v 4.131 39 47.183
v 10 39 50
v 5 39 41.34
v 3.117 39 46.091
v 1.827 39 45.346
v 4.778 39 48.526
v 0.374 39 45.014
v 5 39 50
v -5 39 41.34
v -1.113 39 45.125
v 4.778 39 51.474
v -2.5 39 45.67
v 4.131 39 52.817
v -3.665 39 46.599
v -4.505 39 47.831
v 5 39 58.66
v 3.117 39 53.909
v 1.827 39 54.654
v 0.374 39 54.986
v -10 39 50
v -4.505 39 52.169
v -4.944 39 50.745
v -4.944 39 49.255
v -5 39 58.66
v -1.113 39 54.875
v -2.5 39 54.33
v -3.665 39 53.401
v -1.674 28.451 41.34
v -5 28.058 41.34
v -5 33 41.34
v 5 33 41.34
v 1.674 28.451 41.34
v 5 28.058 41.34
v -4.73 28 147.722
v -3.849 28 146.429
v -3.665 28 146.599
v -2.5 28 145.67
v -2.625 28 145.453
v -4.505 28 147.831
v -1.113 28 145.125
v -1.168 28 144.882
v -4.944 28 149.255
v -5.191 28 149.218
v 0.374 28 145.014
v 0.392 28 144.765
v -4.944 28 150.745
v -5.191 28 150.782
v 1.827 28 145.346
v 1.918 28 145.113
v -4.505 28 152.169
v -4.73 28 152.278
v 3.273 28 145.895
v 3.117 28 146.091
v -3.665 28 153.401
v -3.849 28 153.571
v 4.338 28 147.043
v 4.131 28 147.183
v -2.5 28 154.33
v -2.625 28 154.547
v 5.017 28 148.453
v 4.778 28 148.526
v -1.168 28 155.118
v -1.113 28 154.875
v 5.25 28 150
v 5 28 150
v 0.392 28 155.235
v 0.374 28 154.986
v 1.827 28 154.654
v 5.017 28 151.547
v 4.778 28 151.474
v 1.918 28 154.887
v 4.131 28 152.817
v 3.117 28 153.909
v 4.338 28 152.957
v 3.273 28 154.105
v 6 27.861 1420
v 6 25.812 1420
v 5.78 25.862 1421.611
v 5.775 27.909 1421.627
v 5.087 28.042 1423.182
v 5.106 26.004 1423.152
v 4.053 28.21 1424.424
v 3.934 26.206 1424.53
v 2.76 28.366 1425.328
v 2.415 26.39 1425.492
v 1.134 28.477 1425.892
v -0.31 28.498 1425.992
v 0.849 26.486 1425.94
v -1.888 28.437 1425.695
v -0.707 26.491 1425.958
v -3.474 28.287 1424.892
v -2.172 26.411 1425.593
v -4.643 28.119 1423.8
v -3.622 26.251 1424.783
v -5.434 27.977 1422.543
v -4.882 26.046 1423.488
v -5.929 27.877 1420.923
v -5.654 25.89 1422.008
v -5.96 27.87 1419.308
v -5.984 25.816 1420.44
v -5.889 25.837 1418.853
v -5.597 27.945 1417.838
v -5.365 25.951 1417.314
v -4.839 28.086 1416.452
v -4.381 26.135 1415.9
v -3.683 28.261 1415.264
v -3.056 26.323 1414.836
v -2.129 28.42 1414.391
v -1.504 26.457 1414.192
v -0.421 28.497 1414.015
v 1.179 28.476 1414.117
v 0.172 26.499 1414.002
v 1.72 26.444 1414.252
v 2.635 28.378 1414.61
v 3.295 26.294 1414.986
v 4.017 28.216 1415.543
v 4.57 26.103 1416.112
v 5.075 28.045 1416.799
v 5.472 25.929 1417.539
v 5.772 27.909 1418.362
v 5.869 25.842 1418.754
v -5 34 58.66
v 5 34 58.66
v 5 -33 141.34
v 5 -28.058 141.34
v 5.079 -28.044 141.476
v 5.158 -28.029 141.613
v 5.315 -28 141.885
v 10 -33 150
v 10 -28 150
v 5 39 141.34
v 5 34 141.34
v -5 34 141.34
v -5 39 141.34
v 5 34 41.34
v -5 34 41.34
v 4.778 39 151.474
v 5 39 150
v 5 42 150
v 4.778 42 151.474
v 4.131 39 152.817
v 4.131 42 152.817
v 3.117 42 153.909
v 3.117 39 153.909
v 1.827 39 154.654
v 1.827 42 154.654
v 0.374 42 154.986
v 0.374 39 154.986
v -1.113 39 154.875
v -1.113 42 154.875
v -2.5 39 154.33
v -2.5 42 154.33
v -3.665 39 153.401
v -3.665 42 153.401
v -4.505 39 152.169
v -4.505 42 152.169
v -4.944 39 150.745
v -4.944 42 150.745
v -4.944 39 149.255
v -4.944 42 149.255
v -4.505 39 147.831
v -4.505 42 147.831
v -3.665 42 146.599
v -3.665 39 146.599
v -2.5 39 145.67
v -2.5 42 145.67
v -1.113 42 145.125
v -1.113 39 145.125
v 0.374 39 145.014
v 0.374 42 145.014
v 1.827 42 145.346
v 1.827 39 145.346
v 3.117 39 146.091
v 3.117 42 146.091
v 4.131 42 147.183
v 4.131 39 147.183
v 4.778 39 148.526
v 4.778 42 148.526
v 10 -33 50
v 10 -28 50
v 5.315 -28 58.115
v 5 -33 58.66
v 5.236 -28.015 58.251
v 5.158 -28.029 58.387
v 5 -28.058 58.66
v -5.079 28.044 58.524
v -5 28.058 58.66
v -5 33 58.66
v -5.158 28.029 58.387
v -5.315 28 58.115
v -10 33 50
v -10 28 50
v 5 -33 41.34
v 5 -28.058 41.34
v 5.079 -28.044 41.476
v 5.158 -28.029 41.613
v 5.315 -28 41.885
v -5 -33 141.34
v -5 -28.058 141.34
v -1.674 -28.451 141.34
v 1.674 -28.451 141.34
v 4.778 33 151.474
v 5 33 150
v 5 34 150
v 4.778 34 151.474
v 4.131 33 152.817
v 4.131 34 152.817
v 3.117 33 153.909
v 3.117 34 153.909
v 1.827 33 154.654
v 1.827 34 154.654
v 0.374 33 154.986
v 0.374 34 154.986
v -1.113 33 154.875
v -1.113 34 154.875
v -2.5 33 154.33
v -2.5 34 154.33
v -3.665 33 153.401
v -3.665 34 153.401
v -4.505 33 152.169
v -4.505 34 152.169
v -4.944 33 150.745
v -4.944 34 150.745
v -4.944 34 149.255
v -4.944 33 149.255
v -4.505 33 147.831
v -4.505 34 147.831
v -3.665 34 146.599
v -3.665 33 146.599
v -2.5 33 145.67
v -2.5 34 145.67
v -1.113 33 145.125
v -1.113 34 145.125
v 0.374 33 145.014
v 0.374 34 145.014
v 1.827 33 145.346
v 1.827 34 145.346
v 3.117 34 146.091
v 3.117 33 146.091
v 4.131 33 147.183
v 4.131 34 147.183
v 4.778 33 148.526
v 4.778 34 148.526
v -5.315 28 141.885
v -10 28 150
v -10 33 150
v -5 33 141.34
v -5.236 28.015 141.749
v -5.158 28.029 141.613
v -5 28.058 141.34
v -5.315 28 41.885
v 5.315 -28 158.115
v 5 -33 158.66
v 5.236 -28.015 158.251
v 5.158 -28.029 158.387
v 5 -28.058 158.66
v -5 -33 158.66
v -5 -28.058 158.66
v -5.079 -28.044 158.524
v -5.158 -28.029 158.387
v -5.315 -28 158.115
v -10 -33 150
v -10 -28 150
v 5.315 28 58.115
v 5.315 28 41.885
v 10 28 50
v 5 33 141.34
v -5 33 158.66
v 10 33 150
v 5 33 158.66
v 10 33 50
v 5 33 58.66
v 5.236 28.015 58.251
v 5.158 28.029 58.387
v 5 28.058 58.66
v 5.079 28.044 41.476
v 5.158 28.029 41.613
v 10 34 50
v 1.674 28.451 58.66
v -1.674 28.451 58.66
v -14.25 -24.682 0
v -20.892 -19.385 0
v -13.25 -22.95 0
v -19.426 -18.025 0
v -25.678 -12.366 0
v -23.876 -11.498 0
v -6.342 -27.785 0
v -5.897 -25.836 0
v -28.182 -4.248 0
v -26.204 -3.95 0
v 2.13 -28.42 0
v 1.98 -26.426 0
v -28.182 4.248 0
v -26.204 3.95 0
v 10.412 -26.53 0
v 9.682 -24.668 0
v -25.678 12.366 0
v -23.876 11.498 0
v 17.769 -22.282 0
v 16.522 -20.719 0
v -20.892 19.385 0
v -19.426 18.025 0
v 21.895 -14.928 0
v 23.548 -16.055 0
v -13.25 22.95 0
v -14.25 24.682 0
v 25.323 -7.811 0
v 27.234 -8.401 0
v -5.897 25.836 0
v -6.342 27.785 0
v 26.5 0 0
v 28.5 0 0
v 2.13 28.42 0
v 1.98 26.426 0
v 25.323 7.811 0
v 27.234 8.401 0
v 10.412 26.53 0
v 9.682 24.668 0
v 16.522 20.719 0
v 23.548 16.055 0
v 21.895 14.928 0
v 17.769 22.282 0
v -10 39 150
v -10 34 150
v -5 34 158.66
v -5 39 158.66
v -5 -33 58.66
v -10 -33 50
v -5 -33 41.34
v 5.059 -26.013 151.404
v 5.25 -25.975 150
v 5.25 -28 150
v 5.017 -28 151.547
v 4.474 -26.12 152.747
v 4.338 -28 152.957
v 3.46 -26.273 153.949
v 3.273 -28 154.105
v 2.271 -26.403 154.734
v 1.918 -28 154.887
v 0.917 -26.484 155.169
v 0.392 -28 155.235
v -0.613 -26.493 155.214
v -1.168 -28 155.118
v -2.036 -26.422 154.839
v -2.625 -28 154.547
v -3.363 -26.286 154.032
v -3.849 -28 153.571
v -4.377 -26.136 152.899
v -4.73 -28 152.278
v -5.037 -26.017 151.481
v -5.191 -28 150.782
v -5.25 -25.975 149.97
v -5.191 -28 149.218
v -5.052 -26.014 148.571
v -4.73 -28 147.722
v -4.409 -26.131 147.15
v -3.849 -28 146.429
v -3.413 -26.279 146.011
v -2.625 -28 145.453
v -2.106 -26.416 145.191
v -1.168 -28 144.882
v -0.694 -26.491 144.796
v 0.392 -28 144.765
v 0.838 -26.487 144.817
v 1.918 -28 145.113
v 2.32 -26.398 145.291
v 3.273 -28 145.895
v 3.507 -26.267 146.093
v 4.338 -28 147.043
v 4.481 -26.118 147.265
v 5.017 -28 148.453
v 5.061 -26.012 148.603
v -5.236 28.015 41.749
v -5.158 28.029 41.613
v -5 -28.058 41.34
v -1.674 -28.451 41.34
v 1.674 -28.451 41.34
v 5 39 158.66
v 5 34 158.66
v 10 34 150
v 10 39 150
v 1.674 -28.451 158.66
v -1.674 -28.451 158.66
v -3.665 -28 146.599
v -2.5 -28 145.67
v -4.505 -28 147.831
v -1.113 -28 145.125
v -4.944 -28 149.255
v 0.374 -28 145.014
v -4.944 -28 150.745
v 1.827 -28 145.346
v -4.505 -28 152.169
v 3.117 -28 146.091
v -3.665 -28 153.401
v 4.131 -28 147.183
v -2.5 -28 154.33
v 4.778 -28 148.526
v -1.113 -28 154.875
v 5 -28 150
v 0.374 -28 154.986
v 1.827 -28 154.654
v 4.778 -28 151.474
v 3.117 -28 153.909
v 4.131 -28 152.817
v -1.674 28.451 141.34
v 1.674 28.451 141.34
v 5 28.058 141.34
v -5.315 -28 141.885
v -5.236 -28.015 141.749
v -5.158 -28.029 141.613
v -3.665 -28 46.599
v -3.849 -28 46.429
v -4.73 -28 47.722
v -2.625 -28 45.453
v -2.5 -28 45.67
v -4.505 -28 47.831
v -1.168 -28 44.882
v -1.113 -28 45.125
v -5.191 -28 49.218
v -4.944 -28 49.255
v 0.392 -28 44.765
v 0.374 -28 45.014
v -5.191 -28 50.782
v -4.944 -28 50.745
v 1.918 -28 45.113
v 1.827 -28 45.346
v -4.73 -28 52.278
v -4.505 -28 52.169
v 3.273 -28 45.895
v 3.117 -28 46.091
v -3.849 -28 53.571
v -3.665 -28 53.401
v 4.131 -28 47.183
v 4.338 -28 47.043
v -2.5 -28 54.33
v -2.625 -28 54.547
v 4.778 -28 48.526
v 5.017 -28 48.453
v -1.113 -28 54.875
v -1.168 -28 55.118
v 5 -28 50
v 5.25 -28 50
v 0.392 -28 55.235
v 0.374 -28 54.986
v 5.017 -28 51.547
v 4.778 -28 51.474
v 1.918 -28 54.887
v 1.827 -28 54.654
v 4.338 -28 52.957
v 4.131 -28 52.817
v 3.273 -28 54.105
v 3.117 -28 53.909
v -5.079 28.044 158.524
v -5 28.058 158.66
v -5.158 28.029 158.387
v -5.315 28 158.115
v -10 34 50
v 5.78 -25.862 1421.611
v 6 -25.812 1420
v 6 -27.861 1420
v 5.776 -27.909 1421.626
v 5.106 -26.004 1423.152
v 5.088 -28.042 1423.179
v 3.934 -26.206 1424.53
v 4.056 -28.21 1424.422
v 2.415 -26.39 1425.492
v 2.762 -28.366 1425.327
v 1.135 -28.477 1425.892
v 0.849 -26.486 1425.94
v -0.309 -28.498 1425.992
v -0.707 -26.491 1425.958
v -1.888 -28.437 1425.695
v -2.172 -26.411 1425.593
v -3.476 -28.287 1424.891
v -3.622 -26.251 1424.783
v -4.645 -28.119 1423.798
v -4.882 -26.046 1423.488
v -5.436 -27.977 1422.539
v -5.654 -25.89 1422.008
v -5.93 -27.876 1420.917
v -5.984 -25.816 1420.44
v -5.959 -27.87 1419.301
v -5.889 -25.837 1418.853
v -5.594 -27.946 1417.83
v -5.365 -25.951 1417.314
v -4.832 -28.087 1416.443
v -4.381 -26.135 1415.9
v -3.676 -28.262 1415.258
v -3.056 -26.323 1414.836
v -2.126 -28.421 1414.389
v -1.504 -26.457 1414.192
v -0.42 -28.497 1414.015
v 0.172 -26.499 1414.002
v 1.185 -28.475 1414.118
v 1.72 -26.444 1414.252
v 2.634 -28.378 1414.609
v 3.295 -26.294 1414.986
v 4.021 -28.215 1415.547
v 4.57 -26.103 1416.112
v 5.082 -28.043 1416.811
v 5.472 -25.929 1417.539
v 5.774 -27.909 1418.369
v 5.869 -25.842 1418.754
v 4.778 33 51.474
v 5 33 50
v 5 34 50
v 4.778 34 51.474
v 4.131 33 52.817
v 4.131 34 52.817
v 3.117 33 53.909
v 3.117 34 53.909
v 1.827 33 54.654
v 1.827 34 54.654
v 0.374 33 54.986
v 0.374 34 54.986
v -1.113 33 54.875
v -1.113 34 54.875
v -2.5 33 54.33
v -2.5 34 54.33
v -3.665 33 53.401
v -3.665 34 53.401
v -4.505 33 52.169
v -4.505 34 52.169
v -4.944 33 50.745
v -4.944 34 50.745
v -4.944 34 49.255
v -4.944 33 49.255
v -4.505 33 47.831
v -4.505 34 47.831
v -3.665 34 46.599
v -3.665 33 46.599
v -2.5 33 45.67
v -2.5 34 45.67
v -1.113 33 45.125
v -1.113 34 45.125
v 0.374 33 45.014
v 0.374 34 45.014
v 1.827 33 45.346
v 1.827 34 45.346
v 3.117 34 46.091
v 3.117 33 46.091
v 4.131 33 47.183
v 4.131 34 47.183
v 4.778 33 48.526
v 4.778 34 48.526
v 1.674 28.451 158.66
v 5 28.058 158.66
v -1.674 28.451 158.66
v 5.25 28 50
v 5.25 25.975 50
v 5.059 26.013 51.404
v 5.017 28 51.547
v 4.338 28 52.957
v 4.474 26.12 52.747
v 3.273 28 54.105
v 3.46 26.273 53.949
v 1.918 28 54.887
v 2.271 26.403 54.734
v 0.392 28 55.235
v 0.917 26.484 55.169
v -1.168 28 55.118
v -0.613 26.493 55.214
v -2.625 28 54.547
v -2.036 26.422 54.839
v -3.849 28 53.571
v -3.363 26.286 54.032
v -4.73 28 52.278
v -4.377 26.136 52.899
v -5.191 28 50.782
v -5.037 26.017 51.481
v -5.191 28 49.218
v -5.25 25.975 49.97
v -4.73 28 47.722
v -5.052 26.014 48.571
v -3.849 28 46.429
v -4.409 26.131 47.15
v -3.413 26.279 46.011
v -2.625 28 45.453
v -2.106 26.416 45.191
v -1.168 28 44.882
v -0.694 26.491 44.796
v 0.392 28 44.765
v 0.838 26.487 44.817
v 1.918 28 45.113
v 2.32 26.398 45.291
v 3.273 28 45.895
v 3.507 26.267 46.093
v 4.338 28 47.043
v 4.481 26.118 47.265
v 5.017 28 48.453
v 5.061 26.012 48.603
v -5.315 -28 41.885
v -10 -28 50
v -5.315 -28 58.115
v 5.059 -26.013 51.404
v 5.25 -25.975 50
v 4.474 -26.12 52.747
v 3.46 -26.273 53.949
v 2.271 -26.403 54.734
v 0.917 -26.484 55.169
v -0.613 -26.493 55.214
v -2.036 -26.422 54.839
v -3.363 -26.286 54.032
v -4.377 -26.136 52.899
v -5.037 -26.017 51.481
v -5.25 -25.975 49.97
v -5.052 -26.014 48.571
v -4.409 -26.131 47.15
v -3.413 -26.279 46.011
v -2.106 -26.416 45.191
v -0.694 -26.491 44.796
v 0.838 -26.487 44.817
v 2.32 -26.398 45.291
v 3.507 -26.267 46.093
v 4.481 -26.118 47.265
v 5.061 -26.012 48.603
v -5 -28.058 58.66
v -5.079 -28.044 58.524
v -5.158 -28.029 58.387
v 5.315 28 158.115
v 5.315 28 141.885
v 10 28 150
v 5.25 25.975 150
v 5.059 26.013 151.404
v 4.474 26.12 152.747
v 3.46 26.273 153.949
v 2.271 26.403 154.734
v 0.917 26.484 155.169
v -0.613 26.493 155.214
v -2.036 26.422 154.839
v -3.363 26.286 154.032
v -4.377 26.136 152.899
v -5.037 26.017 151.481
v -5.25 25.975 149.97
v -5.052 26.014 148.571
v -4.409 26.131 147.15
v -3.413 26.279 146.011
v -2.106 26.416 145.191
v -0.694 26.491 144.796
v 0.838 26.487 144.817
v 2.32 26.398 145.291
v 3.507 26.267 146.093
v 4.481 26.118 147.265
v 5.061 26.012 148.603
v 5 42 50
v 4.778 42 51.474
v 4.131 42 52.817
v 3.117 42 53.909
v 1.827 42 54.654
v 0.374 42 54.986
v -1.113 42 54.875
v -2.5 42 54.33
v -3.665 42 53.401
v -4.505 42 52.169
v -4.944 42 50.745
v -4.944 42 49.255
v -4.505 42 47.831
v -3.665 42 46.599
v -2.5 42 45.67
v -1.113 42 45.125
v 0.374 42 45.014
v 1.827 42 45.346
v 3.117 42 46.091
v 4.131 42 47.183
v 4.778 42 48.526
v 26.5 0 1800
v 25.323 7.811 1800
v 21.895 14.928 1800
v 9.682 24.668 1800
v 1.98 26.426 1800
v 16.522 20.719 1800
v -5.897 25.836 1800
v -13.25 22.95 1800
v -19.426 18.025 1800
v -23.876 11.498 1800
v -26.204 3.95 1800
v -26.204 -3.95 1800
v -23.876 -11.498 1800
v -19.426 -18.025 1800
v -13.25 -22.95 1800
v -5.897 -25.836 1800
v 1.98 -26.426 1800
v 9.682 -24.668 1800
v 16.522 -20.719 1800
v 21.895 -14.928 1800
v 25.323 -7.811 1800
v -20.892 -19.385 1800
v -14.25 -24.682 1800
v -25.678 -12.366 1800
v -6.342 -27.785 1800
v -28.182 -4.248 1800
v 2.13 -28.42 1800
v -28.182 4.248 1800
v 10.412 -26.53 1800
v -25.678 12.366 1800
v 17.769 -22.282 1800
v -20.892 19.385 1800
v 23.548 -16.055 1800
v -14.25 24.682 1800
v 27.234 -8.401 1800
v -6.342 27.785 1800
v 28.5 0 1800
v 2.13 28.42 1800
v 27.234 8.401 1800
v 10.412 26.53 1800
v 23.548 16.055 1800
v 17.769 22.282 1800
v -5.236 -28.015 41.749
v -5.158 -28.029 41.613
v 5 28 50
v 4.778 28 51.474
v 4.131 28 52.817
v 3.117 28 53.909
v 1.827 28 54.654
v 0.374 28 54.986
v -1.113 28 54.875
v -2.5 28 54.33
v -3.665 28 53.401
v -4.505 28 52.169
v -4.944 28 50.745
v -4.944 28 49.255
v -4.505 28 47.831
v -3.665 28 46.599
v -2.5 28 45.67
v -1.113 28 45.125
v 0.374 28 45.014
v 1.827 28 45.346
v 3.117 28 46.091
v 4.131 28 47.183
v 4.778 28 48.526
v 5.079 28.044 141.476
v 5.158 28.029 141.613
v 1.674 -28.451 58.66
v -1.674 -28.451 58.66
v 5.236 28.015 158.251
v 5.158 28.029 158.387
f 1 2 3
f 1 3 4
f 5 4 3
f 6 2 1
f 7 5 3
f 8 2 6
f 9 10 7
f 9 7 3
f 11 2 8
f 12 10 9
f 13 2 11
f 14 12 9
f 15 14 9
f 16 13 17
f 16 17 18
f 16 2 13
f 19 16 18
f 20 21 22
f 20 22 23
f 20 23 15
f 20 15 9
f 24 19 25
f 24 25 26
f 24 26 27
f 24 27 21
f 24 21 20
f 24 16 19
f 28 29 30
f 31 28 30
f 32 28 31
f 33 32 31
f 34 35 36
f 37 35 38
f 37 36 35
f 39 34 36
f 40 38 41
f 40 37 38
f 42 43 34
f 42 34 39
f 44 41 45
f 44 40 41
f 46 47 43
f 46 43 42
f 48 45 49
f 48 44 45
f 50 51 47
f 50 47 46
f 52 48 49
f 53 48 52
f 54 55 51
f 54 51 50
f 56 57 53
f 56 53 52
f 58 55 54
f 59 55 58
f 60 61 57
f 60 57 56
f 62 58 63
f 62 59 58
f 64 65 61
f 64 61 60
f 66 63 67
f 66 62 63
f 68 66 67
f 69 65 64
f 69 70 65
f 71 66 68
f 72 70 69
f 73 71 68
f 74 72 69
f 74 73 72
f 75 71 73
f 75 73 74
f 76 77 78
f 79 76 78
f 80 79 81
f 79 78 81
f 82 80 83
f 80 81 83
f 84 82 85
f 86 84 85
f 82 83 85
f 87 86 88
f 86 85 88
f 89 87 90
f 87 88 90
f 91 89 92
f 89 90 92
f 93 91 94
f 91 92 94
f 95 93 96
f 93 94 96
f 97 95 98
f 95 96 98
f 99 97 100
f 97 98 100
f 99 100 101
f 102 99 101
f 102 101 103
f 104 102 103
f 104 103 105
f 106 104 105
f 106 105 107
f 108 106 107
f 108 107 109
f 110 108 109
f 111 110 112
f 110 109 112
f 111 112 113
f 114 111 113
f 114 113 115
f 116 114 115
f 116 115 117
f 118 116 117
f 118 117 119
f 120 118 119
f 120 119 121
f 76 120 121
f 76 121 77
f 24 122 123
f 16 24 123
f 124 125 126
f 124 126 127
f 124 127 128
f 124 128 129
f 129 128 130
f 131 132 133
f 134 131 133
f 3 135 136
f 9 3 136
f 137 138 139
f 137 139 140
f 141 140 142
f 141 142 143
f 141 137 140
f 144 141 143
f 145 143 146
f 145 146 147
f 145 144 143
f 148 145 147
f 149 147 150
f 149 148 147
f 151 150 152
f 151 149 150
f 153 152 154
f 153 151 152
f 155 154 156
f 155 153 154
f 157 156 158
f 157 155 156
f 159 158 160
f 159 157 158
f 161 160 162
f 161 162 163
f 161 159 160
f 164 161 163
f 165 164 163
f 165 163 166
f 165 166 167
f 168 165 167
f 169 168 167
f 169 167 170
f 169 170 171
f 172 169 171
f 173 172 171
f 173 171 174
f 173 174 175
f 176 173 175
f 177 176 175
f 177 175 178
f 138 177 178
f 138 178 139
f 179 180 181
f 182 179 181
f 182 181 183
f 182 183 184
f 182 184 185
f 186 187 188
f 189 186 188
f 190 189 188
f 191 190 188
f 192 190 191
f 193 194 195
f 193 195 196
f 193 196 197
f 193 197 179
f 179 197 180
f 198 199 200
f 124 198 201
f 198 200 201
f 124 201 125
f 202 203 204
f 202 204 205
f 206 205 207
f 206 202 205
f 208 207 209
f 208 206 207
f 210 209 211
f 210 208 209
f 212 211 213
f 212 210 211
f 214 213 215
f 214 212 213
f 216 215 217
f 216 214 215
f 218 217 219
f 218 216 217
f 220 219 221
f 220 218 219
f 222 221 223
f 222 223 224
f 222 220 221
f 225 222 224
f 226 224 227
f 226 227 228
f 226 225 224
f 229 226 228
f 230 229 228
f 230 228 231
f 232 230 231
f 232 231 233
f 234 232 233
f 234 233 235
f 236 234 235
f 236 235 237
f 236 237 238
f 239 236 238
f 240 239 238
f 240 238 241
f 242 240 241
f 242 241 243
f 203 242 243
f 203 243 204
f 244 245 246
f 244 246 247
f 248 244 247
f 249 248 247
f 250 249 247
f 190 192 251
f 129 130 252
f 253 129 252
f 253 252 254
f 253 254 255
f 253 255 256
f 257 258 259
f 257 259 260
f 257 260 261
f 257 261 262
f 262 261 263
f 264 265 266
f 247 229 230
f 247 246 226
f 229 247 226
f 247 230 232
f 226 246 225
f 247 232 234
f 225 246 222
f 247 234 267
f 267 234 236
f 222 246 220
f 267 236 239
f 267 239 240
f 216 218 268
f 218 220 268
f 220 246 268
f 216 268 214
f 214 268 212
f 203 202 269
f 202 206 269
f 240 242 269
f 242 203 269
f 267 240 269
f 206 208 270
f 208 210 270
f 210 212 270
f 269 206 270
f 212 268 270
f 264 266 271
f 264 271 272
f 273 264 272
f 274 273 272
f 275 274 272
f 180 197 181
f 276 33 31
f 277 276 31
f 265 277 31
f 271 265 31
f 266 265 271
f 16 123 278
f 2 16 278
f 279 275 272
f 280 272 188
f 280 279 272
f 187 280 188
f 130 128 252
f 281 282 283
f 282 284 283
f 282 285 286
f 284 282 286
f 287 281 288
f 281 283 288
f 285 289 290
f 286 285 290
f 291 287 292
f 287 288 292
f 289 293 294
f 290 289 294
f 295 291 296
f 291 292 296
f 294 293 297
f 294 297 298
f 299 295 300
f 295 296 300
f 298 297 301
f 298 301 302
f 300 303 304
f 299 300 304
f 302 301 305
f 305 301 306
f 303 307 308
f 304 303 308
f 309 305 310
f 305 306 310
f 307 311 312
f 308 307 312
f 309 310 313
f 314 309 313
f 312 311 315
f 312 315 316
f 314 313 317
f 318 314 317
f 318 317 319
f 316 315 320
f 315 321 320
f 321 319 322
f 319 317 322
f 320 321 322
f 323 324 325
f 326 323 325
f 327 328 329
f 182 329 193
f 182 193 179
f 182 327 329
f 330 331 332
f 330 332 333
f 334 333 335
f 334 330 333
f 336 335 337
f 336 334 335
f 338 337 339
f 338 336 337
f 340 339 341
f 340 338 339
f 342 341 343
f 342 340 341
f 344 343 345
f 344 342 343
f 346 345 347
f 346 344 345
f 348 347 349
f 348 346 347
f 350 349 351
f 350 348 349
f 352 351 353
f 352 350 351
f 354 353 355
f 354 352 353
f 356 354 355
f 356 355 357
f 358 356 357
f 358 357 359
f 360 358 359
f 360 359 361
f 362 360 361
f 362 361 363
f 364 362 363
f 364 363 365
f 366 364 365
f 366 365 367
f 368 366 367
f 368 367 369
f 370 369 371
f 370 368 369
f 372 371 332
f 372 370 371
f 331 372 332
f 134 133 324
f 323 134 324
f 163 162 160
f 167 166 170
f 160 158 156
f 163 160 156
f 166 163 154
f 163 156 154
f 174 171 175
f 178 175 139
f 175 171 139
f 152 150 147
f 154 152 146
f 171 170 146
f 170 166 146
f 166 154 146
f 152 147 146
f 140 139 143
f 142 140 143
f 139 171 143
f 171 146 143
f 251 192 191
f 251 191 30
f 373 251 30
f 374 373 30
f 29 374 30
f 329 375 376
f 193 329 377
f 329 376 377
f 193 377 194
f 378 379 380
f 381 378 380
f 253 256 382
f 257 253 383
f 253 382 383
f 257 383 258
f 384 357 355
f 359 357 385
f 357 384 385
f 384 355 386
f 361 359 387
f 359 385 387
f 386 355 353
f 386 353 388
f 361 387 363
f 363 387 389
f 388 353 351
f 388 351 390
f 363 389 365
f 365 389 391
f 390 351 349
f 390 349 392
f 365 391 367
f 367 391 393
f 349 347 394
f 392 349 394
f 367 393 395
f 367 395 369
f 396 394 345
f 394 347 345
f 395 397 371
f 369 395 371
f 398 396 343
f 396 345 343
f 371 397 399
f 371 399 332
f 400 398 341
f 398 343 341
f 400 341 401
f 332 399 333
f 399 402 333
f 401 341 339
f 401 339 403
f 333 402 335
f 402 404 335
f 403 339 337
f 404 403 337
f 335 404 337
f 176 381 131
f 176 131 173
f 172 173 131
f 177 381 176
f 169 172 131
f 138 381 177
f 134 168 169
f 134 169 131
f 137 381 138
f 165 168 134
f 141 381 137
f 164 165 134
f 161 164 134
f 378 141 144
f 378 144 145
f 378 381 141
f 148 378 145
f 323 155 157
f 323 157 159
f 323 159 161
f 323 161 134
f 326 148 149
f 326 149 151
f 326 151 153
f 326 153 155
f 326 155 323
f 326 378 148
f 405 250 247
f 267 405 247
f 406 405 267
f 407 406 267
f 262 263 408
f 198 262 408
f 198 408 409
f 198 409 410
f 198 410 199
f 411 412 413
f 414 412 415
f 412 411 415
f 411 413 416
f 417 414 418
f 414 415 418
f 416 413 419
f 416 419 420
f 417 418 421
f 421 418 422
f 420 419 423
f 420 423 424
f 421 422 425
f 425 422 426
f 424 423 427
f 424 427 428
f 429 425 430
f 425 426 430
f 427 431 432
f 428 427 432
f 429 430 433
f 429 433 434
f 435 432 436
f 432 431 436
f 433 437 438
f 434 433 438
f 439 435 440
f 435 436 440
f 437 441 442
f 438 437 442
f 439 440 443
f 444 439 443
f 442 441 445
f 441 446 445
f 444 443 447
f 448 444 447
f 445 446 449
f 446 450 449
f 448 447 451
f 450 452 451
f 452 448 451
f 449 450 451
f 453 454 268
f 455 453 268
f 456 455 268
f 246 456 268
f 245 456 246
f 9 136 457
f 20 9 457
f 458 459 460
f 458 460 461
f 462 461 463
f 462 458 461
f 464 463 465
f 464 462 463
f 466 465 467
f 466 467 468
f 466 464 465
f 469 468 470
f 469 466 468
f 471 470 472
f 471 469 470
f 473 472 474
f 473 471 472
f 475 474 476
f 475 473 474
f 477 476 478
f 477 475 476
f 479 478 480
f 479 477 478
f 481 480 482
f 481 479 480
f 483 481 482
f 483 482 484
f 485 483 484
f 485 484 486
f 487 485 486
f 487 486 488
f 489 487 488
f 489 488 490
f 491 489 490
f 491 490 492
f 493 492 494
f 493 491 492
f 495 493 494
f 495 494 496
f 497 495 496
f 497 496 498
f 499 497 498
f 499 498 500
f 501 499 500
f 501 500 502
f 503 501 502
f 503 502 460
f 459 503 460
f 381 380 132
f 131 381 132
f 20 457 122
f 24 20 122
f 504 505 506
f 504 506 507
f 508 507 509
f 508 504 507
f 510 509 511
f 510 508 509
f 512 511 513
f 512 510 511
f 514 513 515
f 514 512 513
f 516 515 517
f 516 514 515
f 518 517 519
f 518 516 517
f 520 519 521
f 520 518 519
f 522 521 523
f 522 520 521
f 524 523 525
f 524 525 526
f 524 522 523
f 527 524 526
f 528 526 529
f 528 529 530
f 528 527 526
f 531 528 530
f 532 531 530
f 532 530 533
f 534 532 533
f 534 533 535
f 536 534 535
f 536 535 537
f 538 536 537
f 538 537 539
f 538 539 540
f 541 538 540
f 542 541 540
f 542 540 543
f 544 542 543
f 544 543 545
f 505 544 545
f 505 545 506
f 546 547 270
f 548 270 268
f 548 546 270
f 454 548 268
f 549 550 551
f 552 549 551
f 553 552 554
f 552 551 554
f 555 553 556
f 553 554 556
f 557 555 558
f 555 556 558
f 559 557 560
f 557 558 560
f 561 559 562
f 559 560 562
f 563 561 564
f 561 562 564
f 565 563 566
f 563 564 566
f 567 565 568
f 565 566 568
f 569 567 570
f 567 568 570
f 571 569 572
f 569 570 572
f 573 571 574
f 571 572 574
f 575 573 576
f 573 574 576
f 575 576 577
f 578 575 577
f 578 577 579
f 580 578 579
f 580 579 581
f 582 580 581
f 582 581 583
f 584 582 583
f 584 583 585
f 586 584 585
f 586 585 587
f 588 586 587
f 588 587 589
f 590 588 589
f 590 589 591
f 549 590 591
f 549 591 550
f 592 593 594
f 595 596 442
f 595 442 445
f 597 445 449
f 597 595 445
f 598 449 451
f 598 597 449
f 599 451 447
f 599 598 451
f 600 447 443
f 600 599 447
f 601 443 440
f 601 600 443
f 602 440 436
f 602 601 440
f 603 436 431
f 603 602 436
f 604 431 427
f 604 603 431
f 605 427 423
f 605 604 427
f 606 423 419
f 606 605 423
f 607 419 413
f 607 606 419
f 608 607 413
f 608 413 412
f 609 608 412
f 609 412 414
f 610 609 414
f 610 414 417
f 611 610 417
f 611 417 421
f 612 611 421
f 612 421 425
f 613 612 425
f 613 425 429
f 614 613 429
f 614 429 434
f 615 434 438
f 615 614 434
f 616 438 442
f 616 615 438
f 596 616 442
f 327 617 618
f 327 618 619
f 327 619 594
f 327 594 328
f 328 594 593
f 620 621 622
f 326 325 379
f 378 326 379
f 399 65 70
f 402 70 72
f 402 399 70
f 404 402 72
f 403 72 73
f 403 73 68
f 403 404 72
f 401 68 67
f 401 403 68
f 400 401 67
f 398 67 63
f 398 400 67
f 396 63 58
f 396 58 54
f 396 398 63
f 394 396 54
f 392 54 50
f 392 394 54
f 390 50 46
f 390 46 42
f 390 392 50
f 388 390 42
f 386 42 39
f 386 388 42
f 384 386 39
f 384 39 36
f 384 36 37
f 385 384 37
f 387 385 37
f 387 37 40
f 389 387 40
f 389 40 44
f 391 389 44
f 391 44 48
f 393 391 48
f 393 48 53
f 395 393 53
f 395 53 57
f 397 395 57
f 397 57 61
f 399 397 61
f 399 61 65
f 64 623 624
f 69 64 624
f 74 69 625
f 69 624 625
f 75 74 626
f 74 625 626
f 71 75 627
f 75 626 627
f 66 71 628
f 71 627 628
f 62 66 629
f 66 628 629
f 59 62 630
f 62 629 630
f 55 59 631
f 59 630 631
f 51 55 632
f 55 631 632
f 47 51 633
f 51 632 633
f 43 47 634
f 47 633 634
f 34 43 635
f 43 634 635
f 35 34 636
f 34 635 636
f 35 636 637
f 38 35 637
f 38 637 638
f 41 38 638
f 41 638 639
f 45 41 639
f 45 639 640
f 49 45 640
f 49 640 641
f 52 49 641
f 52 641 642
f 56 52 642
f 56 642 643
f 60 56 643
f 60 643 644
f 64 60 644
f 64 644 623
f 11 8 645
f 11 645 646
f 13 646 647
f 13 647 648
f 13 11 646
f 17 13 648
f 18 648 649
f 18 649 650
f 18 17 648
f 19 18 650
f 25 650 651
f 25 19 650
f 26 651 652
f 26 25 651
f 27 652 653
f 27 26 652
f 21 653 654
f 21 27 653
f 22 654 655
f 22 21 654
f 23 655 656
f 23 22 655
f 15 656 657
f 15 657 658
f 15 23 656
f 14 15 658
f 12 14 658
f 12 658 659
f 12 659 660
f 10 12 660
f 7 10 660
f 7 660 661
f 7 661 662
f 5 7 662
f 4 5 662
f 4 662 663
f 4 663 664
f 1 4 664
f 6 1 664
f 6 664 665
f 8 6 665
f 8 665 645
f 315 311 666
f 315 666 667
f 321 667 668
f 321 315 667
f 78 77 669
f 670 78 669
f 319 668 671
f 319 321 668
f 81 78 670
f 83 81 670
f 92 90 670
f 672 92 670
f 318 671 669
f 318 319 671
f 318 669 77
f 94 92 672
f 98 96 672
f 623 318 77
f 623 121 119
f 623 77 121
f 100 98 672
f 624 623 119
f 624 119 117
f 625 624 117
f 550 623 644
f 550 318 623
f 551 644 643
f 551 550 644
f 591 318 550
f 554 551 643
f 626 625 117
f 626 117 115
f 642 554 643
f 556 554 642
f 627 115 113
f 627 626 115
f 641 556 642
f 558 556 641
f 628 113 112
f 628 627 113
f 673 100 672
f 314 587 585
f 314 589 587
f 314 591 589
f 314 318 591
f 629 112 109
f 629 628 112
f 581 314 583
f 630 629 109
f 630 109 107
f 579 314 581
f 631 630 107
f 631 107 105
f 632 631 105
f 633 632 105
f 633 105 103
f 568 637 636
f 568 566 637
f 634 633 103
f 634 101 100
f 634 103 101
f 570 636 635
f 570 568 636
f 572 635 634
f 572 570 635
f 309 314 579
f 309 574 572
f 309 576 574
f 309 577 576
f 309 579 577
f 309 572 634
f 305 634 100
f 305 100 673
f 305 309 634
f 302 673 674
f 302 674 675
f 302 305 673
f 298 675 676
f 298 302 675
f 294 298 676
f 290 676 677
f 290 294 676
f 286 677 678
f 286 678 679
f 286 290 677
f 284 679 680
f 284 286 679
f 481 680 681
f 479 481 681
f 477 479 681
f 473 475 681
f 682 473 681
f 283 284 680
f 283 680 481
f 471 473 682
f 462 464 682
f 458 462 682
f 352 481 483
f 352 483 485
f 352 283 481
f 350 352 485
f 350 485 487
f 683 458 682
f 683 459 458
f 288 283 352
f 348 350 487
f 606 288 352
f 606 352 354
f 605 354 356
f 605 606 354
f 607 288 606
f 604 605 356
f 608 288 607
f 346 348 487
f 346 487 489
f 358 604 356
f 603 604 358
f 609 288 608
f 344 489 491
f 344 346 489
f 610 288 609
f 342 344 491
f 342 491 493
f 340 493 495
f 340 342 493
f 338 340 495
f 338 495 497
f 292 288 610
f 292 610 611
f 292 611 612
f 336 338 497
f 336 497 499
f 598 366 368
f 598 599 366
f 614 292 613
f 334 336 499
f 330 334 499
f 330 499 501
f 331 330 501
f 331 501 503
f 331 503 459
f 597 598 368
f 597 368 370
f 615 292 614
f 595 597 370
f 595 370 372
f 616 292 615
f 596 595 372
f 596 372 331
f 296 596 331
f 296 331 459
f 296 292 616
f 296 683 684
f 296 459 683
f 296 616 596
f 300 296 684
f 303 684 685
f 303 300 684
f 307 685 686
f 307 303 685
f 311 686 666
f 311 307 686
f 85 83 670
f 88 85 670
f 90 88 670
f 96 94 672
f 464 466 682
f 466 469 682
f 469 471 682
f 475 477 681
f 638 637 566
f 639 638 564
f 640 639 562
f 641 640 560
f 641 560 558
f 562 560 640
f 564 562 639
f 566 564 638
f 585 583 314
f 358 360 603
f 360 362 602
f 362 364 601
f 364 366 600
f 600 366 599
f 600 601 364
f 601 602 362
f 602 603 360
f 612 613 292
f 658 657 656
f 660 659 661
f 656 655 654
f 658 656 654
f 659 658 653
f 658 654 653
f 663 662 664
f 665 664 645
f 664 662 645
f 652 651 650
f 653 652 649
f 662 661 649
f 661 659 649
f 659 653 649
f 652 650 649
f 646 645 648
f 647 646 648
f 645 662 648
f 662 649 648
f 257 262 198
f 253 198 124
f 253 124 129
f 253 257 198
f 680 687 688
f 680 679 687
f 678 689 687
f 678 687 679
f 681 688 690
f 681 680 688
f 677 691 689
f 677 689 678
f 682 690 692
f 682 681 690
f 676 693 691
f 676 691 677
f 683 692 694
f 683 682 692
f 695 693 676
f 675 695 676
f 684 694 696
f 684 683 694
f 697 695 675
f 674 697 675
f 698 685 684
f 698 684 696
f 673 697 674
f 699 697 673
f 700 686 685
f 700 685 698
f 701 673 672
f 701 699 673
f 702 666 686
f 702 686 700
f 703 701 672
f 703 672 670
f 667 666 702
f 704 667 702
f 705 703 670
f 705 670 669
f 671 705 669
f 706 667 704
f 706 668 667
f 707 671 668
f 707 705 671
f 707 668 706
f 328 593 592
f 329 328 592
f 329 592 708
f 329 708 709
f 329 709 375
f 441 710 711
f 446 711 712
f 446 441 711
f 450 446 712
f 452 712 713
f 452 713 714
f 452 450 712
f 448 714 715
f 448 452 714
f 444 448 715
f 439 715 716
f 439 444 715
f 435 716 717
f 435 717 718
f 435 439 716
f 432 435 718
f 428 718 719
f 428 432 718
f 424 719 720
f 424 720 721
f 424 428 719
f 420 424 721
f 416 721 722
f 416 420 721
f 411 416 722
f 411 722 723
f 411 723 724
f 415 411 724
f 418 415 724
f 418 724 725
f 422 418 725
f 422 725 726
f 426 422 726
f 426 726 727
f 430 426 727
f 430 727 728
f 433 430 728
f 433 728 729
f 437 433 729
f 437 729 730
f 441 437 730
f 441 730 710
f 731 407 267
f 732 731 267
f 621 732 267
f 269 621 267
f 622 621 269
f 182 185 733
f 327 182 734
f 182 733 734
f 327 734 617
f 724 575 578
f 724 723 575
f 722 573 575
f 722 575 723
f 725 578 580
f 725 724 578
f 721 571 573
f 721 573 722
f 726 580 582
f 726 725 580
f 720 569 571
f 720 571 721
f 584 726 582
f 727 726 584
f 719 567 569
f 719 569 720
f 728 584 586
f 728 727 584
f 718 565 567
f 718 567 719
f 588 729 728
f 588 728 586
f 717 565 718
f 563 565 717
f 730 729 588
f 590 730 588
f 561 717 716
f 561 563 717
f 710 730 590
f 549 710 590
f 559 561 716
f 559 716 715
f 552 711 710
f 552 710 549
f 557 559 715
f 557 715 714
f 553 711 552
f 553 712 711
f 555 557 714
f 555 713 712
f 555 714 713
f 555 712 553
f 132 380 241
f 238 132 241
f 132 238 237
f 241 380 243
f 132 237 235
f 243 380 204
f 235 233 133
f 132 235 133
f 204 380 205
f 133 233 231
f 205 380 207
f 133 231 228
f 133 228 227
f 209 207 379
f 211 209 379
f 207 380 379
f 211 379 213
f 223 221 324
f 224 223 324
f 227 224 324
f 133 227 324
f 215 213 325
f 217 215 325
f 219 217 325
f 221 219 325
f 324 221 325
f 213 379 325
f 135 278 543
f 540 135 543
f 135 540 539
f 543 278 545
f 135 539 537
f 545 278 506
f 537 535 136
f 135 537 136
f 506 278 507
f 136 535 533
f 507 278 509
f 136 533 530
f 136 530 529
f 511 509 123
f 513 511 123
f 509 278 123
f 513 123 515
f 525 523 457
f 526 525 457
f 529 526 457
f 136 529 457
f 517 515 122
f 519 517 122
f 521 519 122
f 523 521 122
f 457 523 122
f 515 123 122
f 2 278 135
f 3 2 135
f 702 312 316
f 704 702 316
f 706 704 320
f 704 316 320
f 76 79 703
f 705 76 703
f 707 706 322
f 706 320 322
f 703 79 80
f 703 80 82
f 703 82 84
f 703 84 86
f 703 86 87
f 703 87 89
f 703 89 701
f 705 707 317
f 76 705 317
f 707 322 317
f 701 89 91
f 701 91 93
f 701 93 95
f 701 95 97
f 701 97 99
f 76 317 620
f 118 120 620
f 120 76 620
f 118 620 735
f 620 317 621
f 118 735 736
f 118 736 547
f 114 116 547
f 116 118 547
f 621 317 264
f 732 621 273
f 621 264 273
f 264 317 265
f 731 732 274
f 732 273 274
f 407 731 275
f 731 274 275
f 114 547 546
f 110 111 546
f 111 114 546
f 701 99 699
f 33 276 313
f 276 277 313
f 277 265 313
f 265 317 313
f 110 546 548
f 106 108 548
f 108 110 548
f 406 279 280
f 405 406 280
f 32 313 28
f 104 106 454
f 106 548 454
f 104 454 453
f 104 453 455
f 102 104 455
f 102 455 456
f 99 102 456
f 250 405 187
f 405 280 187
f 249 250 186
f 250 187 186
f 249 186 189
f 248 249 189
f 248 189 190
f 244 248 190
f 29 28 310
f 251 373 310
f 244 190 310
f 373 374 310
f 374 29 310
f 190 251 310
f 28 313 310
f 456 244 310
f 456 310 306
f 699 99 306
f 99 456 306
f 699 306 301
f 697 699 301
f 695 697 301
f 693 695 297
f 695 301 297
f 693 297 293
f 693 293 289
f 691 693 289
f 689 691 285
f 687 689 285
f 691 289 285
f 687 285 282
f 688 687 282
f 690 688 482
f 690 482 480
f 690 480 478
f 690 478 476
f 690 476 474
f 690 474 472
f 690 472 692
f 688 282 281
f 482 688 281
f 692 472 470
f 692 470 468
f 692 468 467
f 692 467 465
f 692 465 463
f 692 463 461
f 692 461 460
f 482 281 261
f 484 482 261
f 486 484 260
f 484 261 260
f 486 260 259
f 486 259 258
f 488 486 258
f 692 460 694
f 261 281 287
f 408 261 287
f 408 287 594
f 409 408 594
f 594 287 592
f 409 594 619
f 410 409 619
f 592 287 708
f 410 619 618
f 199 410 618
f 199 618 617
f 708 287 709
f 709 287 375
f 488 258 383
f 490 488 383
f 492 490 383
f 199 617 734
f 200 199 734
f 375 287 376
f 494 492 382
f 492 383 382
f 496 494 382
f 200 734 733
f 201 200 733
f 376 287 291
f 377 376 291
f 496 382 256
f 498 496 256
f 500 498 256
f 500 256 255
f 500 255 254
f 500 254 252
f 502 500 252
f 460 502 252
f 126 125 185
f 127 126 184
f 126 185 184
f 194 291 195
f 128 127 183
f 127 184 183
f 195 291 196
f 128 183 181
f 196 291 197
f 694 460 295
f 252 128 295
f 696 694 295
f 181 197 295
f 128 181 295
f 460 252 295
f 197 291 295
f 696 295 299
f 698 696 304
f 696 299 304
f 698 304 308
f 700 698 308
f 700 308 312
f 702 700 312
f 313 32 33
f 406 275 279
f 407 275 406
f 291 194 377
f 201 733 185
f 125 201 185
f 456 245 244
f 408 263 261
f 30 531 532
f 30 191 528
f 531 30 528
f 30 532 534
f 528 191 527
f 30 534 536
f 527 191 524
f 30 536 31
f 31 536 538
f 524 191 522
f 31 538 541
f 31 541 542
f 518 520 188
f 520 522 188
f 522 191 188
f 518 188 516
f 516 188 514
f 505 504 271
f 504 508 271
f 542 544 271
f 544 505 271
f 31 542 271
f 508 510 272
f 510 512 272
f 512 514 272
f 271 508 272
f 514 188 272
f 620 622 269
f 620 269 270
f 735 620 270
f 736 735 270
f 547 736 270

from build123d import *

# Parameters (mm, degrees)
F0_R          = 28.5
F0_R_2        = 26.5
F1_DEPTH      = 1800
F2_R          = 5.25
F2_R_2        = 6
F3_DEPTH      = 28.501
F3_DEPTH_BACK = 28.501
F6_DEPTH      = 5
F7_R          = 5
F8_DEPTH      = 70
F11_DEPTH     = 5
F14_DEPTH     = 5


with BuildPart() as f1:
    # F0 (on Top) → F1 (new body)
    with BuildSketch(Plane.XY):
        Circle(F0_R)
        Circle(F0_R_2, mode=Mode.SUBTRACT)
    extrude(amount=F1_DEPTH)

    # F2 (on Front) → F3 (cut, two sides)
    with BuildSketch(Plane.XZ) as f3_sk:
        with Locations((0, 50)):
            Circle(F2_R)
        with Locations((0, 150)):
            Circle(F2_R)
        with Locations((0, 1420)):
            Circle(F2_R_2)
    extrude(amount=-F3_DEPTH, mode=Mode.SUBTRACT)
    extrude(f3_sk.sketch, amount=F3_DEPTH_BACK, mode=Mode.SUBTRACT)

    # F5 (on offset) → F6 (join)
    with BuildSketch(Plane.XZ.offset(28)):
        Polygon((-5, 41.3397459622), (5, 41.3397459622), (10, 50), (5, 58.6602540378), (-5, 58.6602540378), (-10, 50), align=None)
        Polygon((-5, 141.3397459622), (5, 141.3397459622), (10, 150), (5, 158.6602540378), (-5, 158.6602540378), (-10, 150), align=None)
    extrude(amount=F6_DEPTH)

    # F7 (on offset) → F8 (join)
    with BuildSketch(Plane.XZ.offset(28)):
        with Locations((0, 150)):
            Circle(F7_R)
        with Locations((0, 50)):
            Circle(F7_R)
    extrude(amount=-F8_DEPTH)

    # F10 (on offset) → F11 (join)
    with BuildSketch(Plane.XZ.offset(-28)):
        Polygon((-5, 141.3397459622), (5, 141.3397459622), (10, 150), (5, 158.6602540378), (-5, 158.6602540378), (-10, 150), align=None)
        Polygon((-5, 41.3397459622), (5, 41.3397459622), (10, 50), (5, 58.6602540378), (-5, 58.6602540378), (-10, 50), align=None)
    extrude(amount=-F11_DEPTH)

    # F13 (on offset) → F14 (join)
    with BuildSketch(Plane(origin=(0, 34, 0), x_dir=(-1, 0, 0), z_dir=(0, 1, 0))):
        Polygon((-10, 150), (-5, 141.3397459622), (5, 141.3397459622), (10, 150), (5, 158.6602540378), (-5, 158.6602540378), align=None)
        Polygon((-10, 50), (-5, 41.3397459622), (5, 41.3397459622), (10, 50), (5, 58.6602540378), (-5, 58.6602540378), align=None)
    extrude(amount=F14_DEPTH)


solid = f1.part
